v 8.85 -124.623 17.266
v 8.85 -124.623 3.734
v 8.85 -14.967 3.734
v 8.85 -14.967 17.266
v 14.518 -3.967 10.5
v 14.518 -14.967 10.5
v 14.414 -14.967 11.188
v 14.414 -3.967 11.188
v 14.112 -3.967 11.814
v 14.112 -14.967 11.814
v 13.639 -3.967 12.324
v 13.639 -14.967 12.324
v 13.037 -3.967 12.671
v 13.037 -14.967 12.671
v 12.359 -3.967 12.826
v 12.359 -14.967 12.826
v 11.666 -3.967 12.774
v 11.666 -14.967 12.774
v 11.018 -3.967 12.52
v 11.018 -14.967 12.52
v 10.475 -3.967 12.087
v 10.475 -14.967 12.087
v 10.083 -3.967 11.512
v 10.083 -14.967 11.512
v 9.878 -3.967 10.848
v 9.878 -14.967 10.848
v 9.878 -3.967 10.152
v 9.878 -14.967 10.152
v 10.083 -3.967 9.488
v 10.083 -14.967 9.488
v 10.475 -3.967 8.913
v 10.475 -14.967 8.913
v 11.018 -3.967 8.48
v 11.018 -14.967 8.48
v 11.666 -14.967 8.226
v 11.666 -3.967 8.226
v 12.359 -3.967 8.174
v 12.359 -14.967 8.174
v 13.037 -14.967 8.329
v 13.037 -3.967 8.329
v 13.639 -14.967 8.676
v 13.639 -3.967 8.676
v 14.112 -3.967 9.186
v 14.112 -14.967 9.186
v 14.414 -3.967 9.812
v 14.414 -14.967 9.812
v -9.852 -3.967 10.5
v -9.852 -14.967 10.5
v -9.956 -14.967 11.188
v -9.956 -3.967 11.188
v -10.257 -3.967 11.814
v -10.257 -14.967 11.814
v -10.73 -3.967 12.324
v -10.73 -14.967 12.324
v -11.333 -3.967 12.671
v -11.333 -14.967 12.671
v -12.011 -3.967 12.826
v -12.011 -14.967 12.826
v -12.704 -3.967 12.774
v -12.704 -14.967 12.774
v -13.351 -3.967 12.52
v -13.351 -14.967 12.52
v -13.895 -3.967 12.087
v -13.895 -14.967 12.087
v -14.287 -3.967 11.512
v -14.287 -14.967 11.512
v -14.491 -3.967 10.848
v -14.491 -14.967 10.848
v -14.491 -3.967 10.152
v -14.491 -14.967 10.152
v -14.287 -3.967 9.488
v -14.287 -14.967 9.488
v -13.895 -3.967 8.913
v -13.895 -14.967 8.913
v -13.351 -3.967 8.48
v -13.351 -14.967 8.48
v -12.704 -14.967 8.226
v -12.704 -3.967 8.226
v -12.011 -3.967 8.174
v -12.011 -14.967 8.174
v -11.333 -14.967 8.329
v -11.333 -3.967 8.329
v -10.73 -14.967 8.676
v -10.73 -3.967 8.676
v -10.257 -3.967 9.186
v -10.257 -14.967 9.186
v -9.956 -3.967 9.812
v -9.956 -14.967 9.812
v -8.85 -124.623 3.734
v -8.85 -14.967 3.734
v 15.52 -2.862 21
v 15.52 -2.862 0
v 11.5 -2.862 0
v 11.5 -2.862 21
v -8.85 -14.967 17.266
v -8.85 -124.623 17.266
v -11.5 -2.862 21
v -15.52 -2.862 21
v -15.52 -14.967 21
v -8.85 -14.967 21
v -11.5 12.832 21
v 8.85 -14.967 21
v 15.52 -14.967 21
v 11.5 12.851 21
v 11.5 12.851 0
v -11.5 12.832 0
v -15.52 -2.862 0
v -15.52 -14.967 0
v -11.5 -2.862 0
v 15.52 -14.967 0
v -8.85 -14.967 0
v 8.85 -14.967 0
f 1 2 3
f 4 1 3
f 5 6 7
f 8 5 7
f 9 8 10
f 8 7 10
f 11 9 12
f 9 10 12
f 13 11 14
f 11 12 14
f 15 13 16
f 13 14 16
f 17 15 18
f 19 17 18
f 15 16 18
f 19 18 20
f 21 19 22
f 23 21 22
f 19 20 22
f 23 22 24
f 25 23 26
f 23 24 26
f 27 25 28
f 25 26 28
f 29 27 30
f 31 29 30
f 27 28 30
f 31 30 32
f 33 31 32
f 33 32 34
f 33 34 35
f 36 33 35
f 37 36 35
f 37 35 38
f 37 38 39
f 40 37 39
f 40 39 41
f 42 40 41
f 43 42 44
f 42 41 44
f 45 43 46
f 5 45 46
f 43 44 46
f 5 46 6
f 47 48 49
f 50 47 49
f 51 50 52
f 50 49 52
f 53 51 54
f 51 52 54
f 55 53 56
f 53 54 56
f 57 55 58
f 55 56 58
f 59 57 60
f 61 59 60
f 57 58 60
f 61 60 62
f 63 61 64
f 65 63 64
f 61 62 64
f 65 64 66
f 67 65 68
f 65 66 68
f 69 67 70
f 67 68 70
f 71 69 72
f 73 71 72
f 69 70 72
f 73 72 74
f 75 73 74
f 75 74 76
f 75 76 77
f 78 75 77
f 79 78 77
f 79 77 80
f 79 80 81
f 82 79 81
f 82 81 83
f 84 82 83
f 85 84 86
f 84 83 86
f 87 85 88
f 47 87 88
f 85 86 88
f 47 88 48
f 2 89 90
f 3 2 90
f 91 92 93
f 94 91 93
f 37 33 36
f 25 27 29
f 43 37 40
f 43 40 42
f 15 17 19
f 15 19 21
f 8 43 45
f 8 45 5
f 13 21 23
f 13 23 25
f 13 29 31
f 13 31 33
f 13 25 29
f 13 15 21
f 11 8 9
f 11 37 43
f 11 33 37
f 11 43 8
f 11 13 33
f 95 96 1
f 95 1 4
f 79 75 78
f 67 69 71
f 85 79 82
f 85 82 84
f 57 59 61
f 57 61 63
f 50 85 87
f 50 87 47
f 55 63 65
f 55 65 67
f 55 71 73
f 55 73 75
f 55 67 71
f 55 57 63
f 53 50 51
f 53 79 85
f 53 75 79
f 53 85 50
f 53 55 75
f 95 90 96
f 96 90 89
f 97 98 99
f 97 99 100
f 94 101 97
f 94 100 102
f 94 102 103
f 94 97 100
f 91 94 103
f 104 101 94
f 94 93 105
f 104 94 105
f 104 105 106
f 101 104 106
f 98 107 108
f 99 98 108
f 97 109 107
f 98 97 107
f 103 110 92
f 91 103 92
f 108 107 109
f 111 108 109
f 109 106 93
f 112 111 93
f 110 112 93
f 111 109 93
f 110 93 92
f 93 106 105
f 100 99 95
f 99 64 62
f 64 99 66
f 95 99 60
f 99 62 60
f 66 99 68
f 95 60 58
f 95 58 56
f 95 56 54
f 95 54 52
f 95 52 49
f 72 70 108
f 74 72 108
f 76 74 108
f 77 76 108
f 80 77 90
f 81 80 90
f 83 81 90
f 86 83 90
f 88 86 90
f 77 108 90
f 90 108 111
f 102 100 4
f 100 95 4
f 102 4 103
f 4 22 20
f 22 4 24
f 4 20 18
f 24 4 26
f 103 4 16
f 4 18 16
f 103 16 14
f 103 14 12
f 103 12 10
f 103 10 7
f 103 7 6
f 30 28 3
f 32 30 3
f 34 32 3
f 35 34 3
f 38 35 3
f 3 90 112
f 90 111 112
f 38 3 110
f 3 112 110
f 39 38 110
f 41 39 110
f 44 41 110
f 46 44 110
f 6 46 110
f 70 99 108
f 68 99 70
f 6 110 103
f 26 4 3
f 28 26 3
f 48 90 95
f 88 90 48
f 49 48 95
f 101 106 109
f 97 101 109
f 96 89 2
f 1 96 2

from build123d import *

# Parameters (mm, degrees)
BOSS_EXTRUDE1_DEPTH = 21
SKETCH2_R           = 2.332714882
CUT_EXTRUDE1_DEPTH  = 11
CUT_EXTRUDE2_REACH  = 26.37
SKETCH3_W           = 3.734340962
SKETCH3_H           = 109.655613693


with BuildPart() as part:
    # Sketch1 → Boss-Extrude1 (new body)
    with BuildSketch(Plane.XY):
        Polygon((11.4999958, -2.86166347), (11.4999958, 12.851204158), (-11.4999958, 12.831547243), (-11.4999958, -2.86166347), (-15.520087877, -2.86166347), (-15.520087877, -14.967378119), (-11.520087877, -14.967378119), (-8.849574745, -14.967378119), (-8.849574745, -124.622991812), (8.849574745, -124.622991812), (8.849574745, -14.967378119), (11.520087877, -14.967378119), (15.520087877, -14.967378119), (15.520087877, -2.86166347), align=None)
    extrude(amount=BOSS_EXTRUDE1_DEPTH)

    # Sketch2 → Cut-Extrude1 (cut)
    with BuildSketch(Plane.XZ.offset(14.967378119)):
        with Locations((-12.184831311, 10.5)):
            Circle(SKETCH2_R)
        with Locations((12.184831311, 10.5)):
            Circle(SKETCH2_R)
    extrude(amount=-CUT_EXTRUDE1_DEPTH, mode=Mode.SUBTRACT)

    # Sketch3 → Cut-Extrude2 (cut, up to next)
    with BuildSketch(Plane.ZY.offset(8.849574745), mode=Mode.PRIVATE) as cut_extrude2_sk1:
        with Locations((19.132829519, -69.795184965)):
            Rectangle(SKETCH3_W, SKETCH3_H)
    cut_extrude2_tool1 = extrude(cut_extrude2_sk1.sketch, amount=-CUT_EXTRUDE2_REACH, mode=Mode.PRIVATE) & part.part
    add(cut_extrude2_tool1.solids().sort_by_distance((-8.849575, -69.795185, 19.13283))[0], mode=Mode.SUBTRACT)
    # Sketch3 → Cut-Extrude2 (cut, up to next)
    with BuildSketch(Plane.ZY.offset(8.849574745), mode=Mode.PRIVATE) as cut_extrude2_sk2:
        with Locations((1.867170481, -69.795184965)):
            Rectangle(SKETCH3_W, SKETCH3_H)
    cut_extrude2_tool2 = extrude(cut_extrude2_sk2.sketch, amount=-CUT_EXTRUDE2_REACH, mode=Mode.PRIVATE) & part.part
    add(cut_extrude2_tool2.solids().sort_by_distance((-8.849575, -69.795185, 1.86717))[0], mode=Mode.SUBTRACT)


solid = part.part
